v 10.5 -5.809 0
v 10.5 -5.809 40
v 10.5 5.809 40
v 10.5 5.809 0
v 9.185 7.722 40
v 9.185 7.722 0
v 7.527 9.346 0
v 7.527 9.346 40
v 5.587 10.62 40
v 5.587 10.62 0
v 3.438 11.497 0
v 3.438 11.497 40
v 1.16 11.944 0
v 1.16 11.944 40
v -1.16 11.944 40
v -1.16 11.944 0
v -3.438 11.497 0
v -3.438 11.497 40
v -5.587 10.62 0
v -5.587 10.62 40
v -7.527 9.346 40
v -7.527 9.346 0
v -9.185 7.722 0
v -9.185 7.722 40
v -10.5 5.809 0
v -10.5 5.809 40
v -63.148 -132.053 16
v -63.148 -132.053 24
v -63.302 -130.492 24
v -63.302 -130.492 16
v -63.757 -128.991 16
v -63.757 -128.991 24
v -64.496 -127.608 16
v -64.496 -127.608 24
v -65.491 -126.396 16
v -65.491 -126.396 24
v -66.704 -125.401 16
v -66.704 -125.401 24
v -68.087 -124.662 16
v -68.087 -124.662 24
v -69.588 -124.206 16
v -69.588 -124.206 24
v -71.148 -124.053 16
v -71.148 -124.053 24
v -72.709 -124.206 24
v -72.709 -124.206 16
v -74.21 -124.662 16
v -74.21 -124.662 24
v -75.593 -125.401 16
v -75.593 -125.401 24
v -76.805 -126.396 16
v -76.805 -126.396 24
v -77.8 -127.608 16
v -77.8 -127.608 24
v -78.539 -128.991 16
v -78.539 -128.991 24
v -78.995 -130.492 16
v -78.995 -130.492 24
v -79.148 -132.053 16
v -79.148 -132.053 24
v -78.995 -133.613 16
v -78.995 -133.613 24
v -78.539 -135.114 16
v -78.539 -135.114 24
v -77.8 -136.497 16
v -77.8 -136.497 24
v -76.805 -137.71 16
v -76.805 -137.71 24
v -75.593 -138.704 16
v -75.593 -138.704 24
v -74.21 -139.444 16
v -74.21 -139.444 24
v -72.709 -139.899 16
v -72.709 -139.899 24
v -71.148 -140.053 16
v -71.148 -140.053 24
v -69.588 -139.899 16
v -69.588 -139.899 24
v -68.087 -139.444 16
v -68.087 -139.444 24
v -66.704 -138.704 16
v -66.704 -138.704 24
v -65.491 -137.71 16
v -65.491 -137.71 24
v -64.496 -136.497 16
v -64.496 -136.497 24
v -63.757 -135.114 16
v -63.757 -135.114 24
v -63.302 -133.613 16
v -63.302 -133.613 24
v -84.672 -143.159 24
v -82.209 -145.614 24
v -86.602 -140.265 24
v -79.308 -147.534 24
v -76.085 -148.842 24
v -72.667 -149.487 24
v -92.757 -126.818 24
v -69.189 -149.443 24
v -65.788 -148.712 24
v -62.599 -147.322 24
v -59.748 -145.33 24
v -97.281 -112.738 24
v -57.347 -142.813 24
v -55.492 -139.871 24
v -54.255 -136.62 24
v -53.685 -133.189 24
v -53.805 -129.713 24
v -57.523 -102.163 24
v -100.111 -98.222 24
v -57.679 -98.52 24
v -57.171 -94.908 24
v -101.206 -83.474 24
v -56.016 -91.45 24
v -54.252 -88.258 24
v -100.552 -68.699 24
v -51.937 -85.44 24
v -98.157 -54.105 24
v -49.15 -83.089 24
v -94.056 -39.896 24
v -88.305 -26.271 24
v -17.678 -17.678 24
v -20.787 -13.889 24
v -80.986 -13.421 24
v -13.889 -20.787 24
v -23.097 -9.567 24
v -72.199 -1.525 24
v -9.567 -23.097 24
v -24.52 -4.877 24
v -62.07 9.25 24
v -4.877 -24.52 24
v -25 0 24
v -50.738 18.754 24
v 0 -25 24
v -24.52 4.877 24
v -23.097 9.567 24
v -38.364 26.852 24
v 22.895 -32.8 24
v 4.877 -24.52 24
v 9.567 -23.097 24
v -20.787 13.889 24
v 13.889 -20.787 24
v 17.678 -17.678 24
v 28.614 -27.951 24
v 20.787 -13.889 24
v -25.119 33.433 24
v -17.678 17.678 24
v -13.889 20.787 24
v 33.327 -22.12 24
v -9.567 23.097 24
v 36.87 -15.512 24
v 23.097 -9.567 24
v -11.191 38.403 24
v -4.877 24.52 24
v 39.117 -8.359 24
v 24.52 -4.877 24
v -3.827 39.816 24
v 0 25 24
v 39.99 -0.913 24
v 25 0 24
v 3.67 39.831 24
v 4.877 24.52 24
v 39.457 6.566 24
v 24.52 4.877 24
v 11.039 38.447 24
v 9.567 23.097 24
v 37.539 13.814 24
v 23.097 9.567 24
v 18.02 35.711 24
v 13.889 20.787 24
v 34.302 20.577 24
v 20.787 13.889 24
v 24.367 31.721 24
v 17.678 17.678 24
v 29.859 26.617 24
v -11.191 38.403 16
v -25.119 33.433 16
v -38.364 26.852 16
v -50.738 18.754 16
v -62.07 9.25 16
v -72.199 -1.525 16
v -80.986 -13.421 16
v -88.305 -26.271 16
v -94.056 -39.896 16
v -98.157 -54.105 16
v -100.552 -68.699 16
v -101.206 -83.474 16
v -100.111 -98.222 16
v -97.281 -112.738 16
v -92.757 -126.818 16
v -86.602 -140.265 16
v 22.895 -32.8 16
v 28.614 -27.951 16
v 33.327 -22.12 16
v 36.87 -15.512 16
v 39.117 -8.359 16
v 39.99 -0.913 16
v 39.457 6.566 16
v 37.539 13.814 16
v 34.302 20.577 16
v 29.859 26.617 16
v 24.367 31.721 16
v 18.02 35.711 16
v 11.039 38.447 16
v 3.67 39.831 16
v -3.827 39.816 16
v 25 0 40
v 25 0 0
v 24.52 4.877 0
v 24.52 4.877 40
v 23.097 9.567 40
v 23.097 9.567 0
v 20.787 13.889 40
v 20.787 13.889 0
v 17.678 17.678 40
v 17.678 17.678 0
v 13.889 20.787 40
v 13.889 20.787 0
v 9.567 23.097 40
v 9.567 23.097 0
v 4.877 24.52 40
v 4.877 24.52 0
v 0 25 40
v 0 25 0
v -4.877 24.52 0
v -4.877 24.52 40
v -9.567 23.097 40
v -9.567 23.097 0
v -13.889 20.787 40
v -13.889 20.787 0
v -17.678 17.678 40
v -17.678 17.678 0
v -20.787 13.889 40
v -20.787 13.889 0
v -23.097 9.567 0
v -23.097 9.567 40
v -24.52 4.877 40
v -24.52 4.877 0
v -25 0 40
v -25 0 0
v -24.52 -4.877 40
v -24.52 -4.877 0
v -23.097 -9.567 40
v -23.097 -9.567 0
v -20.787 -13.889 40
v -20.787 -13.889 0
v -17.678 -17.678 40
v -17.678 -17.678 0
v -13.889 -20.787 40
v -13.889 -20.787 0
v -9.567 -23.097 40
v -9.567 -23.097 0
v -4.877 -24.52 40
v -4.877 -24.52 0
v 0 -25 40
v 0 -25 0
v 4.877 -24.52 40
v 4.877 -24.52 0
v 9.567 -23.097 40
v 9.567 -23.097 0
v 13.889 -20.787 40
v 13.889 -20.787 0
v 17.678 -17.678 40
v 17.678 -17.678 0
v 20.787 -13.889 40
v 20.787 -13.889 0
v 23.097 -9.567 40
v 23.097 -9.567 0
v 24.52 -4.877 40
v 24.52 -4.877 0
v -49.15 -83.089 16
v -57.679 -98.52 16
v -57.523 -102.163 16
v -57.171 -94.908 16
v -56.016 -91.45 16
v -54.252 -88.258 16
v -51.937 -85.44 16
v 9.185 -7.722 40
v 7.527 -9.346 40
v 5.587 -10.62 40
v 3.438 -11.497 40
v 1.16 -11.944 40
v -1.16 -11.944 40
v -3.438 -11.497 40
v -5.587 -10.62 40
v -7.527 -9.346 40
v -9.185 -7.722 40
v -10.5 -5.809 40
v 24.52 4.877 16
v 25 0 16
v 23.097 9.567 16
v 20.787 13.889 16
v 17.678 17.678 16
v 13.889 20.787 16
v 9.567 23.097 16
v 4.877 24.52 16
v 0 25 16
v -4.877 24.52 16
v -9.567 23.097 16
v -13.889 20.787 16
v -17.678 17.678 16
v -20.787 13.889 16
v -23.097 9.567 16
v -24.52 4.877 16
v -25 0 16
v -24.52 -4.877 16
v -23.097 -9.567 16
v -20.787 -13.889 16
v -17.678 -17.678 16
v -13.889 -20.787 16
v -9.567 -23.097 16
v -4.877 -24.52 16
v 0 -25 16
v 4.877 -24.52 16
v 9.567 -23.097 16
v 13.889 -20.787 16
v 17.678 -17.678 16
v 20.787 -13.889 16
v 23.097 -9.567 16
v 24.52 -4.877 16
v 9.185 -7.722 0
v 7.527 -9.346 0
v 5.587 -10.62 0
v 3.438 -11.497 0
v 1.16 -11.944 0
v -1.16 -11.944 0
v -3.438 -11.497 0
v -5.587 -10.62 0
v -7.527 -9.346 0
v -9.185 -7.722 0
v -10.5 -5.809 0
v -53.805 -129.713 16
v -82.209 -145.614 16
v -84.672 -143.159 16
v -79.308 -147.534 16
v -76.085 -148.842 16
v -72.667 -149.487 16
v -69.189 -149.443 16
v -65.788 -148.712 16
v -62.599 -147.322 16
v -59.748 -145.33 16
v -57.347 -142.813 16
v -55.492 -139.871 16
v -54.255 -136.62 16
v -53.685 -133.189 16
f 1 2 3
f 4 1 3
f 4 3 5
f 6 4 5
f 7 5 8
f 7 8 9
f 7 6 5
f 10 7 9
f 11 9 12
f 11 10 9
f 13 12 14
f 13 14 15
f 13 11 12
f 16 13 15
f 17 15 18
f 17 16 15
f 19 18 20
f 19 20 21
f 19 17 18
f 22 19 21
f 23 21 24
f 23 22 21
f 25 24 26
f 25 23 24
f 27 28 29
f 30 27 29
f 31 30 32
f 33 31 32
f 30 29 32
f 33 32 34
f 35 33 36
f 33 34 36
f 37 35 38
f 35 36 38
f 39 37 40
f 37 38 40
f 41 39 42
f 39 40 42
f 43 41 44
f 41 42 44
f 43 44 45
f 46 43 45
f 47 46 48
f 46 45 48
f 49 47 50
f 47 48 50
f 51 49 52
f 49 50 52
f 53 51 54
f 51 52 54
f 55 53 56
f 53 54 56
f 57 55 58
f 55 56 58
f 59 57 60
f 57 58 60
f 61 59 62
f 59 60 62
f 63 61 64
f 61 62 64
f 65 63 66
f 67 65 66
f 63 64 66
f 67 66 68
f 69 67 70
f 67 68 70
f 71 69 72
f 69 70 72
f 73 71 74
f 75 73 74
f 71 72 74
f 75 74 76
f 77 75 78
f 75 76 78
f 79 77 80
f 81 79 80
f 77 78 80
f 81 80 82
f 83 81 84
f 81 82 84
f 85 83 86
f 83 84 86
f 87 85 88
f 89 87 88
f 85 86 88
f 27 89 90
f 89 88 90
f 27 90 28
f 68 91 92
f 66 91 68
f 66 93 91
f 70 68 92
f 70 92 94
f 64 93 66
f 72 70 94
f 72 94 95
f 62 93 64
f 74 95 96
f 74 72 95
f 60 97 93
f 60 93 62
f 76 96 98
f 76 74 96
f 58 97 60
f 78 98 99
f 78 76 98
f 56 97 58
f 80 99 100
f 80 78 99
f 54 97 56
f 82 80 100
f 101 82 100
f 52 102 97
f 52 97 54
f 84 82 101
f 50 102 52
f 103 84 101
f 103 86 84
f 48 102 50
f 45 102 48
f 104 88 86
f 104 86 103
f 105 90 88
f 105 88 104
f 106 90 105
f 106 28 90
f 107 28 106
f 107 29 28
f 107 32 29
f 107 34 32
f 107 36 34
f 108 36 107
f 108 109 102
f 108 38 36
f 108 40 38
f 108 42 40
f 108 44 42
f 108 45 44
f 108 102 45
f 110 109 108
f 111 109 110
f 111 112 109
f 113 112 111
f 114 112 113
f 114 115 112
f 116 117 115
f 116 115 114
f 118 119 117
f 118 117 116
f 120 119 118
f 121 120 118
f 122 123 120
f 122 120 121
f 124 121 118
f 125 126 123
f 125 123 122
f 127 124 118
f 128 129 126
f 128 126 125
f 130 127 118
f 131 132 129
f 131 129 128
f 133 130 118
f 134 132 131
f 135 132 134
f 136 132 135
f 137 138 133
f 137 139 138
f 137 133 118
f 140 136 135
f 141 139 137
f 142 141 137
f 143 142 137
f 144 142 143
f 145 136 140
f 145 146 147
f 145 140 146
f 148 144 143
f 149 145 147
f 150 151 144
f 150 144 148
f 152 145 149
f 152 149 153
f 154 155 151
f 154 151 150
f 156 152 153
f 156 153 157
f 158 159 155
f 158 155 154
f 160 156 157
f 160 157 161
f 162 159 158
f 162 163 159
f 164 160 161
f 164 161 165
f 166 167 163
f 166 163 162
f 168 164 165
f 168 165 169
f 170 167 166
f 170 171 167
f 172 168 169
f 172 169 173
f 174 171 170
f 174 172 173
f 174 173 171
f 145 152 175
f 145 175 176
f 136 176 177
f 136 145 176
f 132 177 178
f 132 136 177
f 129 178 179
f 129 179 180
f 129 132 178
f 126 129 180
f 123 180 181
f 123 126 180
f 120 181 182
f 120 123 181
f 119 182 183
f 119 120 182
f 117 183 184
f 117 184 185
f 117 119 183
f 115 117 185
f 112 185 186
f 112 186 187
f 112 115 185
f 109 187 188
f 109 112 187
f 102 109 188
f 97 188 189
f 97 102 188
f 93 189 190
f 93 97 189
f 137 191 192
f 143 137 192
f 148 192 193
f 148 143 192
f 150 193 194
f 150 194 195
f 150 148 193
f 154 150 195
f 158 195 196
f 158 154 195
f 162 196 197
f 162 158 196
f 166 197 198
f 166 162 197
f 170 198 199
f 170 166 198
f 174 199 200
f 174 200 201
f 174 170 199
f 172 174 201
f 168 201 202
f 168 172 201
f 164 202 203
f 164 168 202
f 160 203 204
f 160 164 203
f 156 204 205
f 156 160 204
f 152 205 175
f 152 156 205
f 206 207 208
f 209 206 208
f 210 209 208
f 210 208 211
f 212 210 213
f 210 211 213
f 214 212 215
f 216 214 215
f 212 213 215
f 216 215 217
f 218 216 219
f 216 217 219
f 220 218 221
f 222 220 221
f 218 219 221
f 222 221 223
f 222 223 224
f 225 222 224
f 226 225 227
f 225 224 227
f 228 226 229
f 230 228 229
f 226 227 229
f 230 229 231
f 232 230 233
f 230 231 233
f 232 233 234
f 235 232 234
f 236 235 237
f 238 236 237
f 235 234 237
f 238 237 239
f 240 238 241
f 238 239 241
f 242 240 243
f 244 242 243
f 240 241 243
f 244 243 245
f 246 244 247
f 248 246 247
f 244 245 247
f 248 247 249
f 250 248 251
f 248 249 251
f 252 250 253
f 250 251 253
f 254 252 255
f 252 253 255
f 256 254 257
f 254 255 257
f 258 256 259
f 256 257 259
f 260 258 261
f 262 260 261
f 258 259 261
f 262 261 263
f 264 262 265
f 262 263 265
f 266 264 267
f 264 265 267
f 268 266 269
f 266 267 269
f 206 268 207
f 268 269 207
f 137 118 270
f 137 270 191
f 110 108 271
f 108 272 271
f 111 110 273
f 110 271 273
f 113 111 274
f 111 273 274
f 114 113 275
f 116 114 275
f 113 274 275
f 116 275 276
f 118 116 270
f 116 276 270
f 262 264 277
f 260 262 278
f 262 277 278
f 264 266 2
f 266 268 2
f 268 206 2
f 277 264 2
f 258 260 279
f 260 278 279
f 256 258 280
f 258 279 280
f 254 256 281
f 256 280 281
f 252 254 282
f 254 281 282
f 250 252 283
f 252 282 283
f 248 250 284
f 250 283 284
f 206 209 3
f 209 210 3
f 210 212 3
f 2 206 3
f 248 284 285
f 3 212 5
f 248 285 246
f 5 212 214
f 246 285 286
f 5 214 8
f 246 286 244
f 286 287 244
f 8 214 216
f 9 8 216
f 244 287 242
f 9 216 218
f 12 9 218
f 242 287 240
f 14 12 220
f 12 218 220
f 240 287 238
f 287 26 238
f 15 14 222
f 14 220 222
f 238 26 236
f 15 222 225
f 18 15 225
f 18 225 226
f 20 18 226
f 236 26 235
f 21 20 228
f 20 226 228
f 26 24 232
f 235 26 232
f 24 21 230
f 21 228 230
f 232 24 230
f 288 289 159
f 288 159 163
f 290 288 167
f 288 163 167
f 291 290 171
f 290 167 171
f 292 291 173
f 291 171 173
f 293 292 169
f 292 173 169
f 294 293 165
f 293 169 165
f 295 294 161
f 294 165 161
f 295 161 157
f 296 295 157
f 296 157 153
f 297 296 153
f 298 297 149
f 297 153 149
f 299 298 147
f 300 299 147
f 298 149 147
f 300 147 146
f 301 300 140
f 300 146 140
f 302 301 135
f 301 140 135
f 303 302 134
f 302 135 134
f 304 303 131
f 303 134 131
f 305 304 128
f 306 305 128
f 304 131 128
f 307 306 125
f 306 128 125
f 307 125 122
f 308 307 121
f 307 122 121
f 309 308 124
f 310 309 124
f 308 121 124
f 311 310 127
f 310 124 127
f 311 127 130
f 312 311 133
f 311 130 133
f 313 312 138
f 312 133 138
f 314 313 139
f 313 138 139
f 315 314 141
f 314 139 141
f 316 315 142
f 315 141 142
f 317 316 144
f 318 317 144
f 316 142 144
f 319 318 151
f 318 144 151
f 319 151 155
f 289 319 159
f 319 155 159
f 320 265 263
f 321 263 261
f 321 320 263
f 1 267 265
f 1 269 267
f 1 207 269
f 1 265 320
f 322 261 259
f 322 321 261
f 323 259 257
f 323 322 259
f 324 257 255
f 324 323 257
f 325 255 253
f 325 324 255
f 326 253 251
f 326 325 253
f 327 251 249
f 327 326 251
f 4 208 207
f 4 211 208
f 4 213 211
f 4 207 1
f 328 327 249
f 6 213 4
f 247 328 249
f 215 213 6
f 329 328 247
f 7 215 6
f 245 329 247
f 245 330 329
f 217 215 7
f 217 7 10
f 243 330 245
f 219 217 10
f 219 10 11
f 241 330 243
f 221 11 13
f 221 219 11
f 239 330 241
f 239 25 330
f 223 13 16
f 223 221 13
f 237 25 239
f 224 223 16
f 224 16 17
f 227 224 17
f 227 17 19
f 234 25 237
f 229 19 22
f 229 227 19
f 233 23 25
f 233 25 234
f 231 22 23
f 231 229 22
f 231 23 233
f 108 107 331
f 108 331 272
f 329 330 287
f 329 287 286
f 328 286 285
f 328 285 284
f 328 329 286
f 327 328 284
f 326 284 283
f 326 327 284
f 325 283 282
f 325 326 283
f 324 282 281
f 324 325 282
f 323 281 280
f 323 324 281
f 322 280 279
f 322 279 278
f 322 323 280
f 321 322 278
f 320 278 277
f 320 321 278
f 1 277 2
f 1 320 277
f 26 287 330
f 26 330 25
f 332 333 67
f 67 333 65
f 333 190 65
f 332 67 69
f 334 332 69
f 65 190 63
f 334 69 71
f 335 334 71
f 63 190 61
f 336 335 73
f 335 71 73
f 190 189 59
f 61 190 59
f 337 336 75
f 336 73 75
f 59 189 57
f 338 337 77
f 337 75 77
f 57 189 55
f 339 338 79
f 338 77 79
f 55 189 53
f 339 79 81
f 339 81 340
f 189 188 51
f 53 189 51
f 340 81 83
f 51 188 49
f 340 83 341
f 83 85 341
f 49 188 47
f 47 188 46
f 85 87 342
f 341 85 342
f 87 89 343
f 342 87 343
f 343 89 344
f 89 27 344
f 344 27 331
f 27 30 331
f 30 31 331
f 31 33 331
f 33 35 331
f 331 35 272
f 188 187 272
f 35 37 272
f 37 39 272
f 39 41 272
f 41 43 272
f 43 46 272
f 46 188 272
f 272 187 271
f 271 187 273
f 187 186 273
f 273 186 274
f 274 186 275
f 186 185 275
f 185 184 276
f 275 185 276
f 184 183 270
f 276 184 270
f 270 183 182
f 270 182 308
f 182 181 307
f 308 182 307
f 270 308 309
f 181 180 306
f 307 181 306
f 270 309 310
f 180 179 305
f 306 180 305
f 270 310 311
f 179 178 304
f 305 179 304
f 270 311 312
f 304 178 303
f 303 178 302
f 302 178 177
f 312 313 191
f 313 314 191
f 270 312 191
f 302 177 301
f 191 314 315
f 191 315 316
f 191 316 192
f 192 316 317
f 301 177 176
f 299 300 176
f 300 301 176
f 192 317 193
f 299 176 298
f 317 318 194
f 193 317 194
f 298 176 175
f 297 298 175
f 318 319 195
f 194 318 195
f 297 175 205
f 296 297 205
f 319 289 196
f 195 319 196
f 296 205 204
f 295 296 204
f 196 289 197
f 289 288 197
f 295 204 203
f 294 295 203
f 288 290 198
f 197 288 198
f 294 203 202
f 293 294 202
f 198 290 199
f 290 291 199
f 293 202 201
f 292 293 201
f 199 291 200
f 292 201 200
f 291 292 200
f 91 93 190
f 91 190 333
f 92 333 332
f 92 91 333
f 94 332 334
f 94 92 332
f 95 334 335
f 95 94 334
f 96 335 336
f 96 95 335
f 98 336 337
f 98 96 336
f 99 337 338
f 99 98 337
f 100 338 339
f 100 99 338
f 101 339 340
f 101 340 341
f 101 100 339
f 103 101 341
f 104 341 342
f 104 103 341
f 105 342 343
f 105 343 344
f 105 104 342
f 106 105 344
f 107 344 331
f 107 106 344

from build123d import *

# Parameters (mm, degrees)
SKETCH1_R           = 25
SKETCH1_R_2         = 12
BOSS_EXTRUDE1_DEPTH = 40
SKETCH3_R           = 25
SKETCH3_R_2         = 8
BOSS_EXTRUDE2_DEPTH = 8
FILLET1_R           = 20
BOSS_EXTRUDE3_START = -40
BOSS_EXTRUDE3_DEPTH = 40


with BuildPart() as part:
    # Sketch1 → Boss-Extrude1 (new body)
    with BuildSketch(Plane.XY):
        Circle(SKETCH1_R)
        Circle(SKETCH1_R_2, mode=Mode.SUBTRACT)
    extrude(amount=BOSS_EXTRUDE1_DEPTH)

    # Sketch4 → Boss-Extrude3 (add)
    with BuildSketch(Plane.XY.offset(40).offset(BOSS_EXTRUDE3_START)):
        with BuildLine():
            Line((-10.5, -5.809475019), (-10.5, 5.809475019))
            ThreePointArc((-10.5, 5.809475019), (-12, 0), (-10.5, -5.809475019))
        make_face()
        with BuildLine():
            Line((10.5, -5.809475019), (10.5, 5.809475019))
            ThreePointArc((10.5, 5.809475019), (12, 0), (10.5, -5.809475019))
        make_face()
    extrude(amount=BOSS_EXTRUDE3_DEPTH)


with BuildPart() as body_2:
    # Sketch3 → Boss-Extrude2 (new body)
    with BuildSketch(Plane.XY.offset(40)):
        with BuildLine():
            Line((-53.805427475, -129.712579959), (-59.154362217, -90.071832021))
            Line((-59.154362217, -90.071832021), (22.894902471, -32.799747573))
            ThreePointArc((22.894902471, -32.799747573), (36.079037262, 17.271452465), (-11.190557993, 38.402752659))
            ThreePointArc((-11.190557993, 38.402752659), (-91.382352121, -32.998777327), (-86.601681047, -140.265023248))
            ThreePointArc((-86.601681047, -140.265023248), (-65.78812655, -148.711641222), (-53.805427475, -129.712579959))
        make_face()
        Circle(SKETCH3_R, mode=Mode.SUBTRACT)
        with Locations((-71.148254698, -132.052738909)):
            Circle(SKETCH3_R_2, mode=Mode.SUBTRACT)
    extrude(amount=-BOSS_EXTRUDE2_DEPTH)

    # Fillet1
    fillet1_edges = [body_2.edges().sort_by_distance(p)[0] for p in [
        (-59.154362217, -90.071832021, 36),
    ]]
    fillet(fillet1_edges, radius=FILLET1_R)


with BuildPart() as body_2_1:
    # Body-Move/Copy1: moved
    add(body_2.part.moved(Location((0, 0, -16))))


solid = Compound([part.part, body_2_1.part])
